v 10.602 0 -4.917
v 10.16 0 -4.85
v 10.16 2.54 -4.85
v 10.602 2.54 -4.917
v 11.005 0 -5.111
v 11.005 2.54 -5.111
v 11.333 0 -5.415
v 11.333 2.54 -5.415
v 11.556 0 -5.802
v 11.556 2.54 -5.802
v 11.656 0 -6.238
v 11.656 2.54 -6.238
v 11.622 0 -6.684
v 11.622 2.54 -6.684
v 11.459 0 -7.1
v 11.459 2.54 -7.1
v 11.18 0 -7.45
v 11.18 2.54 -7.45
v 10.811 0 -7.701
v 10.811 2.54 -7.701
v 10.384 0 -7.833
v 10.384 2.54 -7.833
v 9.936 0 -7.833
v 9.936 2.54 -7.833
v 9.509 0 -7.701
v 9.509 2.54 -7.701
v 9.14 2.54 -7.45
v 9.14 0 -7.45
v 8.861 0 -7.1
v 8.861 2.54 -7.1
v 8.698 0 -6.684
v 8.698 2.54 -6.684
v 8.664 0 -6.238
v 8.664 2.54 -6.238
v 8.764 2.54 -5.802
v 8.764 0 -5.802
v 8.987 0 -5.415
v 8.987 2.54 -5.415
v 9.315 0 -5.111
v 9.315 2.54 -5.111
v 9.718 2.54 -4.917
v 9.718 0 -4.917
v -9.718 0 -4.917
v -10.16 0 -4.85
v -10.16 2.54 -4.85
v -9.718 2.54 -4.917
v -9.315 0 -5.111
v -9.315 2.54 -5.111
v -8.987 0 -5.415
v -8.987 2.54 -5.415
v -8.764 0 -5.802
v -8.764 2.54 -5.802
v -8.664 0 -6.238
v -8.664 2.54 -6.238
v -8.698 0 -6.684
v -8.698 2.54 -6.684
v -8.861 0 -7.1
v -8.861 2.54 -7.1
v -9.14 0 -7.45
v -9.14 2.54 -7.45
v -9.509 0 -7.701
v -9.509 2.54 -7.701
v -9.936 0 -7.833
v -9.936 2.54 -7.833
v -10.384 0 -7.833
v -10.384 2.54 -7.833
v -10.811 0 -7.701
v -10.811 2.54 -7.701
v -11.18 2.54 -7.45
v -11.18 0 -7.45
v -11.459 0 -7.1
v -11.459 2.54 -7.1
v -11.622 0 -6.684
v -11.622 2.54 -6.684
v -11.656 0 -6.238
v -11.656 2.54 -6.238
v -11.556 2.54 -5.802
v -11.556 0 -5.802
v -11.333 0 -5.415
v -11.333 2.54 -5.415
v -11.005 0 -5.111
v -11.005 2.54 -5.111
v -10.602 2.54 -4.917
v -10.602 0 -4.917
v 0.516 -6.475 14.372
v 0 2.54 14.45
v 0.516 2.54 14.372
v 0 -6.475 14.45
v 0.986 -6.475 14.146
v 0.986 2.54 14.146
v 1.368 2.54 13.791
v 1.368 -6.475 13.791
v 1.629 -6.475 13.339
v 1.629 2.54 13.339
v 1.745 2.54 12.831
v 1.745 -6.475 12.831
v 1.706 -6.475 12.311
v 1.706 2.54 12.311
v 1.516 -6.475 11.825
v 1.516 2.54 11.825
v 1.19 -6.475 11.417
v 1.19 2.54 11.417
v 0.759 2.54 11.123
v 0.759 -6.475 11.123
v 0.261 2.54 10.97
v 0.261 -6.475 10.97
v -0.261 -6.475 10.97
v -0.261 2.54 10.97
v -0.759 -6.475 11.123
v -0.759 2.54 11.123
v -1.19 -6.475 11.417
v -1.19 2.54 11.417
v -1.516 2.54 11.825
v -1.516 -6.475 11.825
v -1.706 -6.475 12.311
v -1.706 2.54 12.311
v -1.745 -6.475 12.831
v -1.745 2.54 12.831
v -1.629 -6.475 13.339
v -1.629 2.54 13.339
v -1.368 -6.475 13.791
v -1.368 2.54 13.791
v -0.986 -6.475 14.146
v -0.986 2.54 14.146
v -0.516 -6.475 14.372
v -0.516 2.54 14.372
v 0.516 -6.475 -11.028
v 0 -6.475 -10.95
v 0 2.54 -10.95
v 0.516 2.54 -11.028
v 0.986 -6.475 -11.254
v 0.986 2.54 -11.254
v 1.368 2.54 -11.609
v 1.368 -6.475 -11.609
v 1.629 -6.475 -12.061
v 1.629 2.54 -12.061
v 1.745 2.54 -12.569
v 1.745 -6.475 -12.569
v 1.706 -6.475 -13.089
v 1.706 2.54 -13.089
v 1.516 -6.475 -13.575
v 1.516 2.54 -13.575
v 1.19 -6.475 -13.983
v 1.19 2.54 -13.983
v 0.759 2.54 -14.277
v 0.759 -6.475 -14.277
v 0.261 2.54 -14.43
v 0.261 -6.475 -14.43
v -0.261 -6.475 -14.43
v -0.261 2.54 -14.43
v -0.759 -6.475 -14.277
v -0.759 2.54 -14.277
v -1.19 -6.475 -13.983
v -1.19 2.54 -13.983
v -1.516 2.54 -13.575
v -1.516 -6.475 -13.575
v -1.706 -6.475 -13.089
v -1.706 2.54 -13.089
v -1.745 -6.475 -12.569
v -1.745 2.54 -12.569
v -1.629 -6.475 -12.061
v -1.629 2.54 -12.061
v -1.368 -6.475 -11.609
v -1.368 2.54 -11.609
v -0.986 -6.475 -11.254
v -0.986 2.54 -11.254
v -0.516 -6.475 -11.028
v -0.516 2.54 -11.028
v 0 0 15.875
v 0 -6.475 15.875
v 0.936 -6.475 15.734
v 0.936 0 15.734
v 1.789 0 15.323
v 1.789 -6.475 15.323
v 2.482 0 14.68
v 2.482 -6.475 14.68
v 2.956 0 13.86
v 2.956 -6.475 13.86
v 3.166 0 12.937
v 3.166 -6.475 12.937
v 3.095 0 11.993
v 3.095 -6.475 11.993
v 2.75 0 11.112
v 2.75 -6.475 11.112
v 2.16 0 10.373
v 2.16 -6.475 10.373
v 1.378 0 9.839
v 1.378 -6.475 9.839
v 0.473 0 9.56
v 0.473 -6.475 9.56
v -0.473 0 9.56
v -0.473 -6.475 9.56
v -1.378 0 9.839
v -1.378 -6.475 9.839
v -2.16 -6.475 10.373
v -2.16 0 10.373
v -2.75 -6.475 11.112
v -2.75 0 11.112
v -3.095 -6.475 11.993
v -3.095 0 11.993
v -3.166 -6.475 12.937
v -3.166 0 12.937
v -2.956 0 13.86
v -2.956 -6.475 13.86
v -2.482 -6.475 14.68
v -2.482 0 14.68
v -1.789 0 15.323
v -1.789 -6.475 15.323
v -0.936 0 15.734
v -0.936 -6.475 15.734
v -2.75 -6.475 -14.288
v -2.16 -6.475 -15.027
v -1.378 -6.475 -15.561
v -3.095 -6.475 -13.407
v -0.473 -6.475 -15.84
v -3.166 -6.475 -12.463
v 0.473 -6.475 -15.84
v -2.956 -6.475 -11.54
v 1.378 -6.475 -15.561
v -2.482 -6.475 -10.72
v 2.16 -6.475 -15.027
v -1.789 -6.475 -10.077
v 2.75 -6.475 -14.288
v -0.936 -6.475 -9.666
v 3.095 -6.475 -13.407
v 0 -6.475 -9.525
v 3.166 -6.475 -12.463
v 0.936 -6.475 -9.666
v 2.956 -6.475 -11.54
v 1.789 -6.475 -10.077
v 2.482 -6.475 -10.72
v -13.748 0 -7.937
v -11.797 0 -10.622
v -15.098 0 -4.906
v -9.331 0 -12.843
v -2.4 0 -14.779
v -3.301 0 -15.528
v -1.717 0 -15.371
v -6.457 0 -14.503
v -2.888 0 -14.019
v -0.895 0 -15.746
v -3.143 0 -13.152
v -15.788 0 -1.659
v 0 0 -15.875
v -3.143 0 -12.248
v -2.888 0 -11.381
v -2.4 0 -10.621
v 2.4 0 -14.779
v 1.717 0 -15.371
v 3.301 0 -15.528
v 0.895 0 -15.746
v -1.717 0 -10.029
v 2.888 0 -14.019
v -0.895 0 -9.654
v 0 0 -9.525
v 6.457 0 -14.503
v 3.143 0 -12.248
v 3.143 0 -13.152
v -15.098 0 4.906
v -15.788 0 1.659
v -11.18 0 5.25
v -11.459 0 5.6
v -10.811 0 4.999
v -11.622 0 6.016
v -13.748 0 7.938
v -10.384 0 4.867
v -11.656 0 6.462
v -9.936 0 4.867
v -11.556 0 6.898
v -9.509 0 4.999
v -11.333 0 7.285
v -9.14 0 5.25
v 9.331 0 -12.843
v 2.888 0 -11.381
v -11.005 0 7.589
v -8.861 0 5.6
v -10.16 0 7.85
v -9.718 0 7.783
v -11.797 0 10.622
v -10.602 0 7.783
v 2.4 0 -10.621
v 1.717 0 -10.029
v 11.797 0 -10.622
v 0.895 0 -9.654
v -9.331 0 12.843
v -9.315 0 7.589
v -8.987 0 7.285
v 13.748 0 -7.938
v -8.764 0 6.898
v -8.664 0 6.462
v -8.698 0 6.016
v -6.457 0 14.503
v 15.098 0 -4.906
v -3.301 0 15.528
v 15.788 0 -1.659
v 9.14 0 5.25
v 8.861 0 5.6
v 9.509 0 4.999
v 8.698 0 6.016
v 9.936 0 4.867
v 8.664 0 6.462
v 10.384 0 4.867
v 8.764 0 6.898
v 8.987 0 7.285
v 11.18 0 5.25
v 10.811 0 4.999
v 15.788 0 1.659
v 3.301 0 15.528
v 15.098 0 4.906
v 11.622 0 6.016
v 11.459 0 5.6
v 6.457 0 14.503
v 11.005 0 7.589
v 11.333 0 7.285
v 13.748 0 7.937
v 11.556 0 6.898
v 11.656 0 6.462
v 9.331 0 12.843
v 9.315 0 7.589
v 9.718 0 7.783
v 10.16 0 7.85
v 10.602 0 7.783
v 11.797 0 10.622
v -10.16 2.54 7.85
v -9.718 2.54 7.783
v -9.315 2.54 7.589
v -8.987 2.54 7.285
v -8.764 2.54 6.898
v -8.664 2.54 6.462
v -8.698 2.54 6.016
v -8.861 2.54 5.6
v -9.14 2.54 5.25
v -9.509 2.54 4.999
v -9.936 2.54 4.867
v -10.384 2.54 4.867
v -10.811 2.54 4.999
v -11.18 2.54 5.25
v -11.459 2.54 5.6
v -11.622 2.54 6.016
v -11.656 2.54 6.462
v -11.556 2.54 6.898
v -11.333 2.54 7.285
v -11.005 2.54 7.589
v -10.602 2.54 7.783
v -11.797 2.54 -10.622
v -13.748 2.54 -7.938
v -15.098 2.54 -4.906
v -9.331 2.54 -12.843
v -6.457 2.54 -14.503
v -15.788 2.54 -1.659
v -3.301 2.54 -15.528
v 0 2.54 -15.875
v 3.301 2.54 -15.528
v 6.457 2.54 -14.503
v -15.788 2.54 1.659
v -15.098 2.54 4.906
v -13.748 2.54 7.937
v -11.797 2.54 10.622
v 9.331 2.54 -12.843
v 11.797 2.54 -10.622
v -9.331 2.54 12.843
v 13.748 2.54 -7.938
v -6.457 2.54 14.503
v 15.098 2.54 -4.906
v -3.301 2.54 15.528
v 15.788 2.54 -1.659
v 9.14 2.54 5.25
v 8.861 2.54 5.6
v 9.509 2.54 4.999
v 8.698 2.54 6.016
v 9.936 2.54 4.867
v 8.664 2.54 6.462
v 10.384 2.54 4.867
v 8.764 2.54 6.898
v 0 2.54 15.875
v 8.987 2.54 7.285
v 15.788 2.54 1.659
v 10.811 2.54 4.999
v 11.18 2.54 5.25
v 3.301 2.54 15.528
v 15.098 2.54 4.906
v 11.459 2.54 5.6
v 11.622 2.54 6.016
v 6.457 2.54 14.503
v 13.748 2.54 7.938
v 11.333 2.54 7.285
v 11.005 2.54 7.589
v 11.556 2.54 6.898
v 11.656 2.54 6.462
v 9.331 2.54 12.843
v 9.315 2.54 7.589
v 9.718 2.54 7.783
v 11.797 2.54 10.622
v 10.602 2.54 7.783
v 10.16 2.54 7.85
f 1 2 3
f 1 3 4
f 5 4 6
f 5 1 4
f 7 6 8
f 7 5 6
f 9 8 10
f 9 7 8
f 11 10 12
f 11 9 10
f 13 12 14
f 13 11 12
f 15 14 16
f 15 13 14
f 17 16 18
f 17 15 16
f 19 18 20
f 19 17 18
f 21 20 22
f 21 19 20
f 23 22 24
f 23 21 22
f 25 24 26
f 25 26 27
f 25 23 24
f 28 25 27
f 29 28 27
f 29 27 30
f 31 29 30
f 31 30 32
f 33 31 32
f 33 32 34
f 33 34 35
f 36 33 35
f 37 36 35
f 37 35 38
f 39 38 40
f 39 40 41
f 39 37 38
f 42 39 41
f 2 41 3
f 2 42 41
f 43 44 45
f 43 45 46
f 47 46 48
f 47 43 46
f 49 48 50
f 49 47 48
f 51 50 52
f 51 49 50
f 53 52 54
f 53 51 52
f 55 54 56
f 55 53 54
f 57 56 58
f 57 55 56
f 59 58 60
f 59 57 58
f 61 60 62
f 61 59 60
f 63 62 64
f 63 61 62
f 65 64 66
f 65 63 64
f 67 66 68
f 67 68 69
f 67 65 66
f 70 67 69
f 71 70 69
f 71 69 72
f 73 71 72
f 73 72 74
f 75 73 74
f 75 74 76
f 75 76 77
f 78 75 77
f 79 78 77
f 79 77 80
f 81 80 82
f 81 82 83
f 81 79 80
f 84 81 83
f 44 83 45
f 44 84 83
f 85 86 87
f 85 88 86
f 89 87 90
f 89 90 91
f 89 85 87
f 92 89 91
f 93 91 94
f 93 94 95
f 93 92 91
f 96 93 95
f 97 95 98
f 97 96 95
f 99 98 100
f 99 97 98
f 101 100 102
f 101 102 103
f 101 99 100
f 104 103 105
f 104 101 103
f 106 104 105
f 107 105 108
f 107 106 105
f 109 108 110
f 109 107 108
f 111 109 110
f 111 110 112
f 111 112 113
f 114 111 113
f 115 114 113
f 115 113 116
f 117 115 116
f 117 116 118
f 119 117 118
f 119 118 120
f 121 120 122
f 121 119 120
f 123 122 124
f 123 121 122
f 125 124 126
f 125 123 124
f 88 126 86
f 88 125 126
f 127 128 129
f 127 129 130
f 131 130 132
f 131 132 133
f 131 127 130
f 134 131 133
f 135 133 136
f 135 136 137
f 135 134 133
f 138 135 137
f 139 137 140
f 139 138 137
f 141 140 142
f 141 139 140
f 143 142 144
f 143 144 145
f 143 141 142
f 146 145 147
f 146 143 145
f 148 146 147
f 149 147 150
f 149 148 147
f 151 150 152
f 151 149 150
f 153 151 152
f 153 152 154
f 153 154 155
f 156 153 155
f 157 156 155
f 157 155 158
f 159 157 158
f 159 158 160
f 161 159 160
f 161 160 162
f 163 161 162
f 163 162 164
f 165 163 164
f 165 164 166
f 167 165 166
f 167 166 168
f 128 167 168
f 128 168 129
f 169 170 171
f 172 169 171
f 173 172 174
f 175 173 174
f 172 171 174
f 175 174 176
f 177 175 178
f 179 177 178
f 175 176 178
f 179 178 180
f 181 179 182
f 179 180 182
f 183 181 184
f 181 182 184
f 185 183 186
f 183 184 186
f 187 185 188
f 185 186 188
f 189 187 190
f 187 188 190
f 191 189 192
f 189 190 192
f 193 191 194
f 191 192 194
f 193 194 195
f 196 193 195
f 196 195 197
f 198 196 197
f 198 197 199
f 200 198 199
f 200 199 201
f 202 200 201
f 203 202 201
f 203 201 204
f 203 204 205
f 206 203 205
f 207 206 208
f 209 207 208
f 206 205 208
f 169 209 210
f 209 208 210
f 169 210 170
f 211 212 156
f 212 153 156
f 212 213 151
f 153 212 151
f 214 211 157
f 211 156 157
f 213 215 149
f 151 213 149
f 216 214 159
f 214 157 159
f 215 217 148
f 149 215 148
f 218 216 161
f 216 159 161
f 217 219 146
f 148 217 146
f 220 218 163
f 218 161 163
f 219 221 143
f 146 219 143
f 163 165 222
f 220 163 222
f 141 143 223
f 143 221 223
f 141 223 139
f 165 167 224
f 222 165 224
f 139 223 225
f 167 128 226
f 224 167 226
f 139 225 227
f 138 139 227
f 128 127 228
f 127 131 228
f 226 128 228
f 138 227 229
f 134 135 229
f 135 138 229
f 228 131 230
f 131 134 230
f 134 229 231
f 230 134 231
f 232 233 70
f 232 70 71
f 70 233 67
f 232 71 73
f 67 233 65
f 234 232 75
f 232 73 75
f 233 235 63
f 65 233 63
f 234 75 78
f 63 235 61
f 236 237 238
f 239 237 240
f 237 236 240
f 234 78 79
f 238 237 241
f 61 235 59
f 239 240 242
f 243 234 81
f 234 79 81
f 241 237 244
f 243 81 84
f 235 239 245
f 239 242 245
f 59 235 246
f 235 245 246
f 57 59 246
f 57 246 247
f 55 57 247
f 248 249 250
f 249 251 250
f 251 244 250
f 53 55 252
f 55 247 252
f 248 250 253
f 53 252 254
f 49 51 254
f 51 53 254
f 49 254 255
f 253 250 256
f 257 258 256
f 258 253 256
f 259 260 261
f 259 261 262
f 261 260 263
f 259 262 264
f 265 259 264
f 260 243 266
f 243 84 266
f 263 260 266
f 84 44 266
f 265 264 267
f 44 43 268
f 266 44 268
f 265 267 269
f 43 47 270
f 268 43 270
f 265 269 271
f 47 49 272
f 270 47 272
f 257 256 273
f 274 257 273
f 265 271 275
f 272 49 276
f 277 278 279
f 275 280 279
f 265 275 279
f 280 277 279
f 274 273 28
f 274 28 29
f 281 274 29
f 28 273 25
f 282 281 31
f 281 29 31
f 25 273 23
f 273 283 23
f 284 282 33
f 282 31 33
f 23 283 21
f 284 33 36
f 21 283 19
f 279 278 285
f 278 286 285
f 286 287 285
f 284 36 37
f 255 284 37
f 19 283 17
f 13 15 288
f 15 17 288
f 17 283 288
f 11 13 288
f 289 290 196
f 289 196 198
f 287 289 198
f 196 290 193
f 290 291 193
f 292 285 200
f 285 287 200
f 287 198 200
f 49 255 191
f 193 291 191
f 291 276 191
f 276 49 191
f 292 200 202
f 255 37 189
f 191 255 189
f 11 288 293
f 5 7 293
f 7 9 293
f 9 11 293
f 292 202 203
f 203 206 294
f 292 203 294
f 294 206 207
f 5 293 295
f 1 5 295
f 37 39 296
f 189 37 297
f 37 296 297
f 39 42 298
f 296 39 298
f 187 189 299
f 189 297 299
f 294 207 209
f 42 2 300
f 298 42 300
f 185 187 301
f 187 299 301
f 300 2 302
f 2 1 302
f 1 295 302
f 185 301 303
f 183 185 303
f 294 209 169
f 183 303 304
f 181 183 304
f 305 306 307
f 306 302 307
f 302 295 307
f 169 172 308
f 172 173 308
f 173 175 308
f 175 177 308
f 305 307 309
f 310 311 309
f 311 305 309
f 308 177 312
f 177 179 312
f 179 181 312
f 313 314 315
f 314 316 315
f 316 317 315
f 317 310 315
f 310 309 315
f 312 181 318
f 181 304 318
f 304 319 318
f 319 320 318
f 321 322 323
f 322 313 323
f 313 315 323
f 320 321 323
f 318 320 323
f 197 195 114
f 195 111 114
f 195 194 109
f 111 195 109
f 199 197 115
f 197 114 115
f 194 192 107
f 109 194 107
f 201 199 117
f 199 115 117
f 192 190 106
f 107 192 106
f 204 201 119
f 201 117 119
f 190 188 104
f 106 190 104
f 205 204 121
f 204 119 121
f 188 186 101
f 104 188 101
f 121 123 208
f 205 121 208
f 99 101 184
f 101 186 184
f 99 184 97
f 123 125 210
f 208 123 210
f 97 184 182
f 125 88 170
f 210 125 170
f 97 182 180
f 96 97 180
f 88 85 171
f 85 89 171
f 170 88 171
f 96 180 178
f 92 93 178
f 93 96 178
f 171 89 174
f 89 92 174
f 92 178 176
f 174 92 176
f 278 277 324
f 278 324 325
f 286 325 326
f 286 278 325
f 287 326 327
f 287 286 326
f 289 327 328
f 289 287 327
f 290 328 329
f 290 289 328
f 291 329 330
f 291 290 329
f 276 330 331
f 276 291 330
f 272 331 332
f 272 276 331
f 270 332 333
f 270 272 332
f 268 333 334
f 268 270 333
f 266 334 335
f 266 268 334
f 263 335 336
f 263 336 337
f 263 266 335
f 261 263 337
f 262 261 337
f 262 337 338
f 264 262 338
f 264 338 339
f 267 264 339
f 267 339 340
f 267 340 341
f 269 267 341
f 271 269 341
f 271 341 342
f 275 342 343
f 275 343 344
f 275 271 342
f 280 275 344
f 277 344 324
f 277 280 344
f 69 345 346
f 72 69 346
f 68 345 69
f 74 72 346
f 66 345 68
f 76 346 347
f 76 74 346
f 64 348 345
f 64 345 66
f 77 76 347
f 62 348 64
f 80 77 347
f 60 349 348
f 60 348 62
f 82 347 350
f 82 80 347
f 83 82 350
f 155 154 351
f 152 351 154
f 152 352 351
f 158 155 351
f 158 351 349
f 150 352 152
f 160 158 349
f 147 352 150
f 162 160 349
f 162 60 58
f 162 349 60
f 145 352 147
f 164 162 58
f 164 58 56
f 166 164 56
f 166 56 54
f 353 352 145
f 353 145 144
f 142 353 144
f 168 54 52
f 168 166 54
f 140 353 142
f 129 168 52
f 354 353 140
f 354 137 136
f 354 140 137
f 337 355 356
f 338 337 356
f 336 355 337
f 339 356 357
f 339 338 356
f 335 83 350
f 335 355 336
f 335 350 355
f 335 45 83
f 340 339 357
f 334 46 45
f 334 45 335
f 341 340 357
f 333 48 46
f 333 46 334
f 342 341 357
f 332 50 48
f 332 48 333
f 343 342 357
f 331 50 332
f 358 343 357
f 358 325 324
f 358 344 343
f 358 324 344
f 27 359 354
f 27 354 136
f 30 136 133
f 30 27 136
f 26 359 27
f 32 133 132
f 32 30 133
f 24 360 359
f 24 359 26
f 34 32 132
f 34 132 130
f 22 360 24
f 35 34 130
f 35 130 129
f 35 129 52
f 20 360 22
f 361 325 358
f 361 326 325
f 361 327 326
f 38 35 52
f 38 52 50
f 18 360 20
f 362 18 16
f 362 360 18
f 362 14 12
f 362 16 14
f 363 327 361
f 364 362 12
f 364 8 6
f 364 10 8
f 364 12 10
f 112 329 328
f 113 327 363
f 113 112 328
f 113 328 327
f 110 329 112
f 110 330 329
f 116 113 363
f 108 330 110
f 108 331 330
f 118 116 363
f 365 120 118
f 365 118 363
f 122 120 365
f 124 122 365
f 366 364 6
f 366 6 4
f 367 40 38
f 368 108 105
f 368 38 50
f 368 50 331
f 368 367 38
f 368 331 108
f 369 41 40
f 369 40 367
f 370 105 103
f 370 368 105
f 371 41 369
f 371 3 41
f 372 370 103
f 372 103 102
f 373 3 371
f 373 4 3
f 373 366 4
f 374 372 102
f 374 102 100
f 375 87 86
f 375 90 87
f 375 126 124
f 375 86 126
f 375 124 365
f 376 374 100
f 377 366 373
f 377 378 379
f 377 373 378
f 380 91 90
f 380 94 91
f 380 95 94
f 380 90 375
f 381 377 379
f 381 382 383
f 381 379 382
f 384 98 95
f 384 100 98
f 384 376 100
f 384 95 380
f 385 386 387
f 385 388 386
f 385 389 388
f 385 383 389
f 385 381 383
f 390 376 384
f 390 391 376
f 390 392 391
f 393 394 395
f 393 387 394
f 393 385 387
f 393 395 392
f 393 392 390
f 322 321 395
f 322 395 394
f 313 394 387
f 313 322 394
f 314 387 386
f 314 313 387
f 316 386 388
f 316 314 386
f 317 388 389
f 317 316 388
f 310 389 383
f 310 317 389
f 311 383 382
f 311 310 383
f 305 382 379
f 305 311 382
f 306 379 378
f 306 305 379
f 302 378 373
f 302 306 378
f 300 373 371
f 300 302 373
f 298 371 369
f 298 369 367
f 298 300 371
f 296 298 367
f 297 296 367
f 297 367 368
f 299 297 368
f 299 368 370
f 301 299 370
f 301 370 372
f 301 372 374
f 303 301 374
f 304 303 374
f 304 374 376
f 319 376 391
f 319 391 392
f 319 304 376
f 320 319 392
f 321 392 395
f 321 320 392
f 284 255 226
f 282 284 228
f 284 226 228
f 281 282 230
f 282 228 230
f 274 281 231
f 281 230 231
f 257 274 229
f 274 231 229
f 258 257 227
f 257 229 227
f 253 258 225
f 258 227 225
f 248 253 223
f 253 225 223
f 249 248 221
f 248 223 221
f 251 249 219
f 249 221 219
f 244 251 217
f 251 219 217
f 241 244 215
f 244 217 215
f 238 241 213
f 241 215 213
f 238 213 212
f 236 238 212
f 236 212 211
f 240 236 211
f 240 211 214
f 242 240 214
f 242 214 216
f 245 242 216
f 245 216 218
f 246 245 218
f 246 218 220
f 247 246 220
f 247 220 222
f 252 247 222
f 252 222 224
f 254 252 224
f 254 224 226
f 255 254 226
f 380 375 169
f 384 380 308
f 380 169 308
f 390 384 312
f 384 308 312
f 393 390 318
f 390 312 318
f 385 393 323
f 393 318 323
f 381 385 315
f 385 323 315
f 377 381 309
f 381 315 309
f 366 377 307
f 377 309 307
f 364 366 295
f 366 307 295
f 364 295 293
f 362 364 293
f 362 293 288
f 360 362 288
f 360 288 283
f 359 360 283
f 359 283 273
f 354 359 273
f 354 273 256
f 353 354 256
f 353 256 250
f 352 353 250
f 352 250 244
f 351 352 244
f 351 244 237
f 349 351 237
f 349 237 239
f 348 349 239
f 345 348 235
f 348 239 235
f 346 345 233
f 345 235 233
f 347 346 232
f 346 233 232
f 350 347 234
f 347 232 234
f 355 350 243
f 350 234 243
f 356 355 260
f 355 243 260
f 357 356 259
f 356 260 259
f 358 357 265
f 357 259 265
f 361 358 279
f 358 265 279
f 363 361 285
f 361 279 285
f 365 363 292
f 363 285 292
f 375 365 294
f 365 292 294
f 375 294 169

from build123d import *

# Parameters (mm, degrees)
SKETCH1_R           = 15.875
SKETCH1_R_2         = 1.5
SKETCH1_R_3         = 1.75
BOSS_EXTRUDE1_DEPTH = 2.54
BOSS_EXTRUDE2_START = -6.474999999
SKETCH1_3_R         = 3.175
SKETCH1_3_R_2       = 1.75
BOSS_EXTRUDE2_DEPTH = 6.474999999


with BuildPart() as part:
    # Sketch1 → Boss-Extrude1 (new body)
    with BuildSketch(Plane(origin=(0, 0, 0), x_dir=(1, 0, 0), z_dir=(0, 1, 0))):
        Circle(SKETCH1_R)
        with Locations((-10.16, -6.35)):
            Circle(SKETCH1_R_2, mode=Mode.SUBTRACT)
        with Locations((10.16, -6.35)):
            Circle(SKETCH1_R_2, mode=Mode.SUBTRACT)
        with Locations((-10.16, 6.35)):
            Circle(SKETCH1_R_2, mode=Mode.SUBTRACT)
        with Locations((10.16, 6.35)):
            Circle(SKETCH1_R_2, mode=Mode.SUBTRACT)
        with Locations((0, -12.7)):
            Circle(SKETCH1_R_3, mode=Mode.SUBTRACT)
        with Locations((0, 12.7)):
            Circle(SKETCH1_R_3, mode=Mode.SUBTRACT)
    extrude(amount=BOSS_EXTRUDE1_DEPTH)

    # Sketch1<3> → Boss-Extrude2 (add)
    # profile 1 of 2: a face of its own
    with BuildSketch(Plane(origin=(0, 0, 0), x_dir=(1, 0, 0), z_dir=(0, 1, 0)).offset(BOSS_EXTRUDE2_START)):
        with Locations((0, 12.7)):
            Circle(SKETCH1_3_R)
        with Locations((0, 12.7)):
            Circle(SKETCH1_3_R_2, mode=Mode.SUBTRACT)
    # profile 2 of 2: a face of its own
    with BuildSketch(Plane(origin=(0, 0, 0), x_dir=(1, 0, 0), z_dir=(0, 1, 0)).offset(BOSS_EXTRUDE2_START)):
        with Locations((0, -12.7)):
            Circle(SKETCH1_3_R)
        with Locations((0, -12.7)):
            Circle(SKETCH1_3_R_2, mode=Mode.SUBTRACT)
    extrude(amount=BOSS_EXTRUDE2_DEPTH)


solid = part.part
